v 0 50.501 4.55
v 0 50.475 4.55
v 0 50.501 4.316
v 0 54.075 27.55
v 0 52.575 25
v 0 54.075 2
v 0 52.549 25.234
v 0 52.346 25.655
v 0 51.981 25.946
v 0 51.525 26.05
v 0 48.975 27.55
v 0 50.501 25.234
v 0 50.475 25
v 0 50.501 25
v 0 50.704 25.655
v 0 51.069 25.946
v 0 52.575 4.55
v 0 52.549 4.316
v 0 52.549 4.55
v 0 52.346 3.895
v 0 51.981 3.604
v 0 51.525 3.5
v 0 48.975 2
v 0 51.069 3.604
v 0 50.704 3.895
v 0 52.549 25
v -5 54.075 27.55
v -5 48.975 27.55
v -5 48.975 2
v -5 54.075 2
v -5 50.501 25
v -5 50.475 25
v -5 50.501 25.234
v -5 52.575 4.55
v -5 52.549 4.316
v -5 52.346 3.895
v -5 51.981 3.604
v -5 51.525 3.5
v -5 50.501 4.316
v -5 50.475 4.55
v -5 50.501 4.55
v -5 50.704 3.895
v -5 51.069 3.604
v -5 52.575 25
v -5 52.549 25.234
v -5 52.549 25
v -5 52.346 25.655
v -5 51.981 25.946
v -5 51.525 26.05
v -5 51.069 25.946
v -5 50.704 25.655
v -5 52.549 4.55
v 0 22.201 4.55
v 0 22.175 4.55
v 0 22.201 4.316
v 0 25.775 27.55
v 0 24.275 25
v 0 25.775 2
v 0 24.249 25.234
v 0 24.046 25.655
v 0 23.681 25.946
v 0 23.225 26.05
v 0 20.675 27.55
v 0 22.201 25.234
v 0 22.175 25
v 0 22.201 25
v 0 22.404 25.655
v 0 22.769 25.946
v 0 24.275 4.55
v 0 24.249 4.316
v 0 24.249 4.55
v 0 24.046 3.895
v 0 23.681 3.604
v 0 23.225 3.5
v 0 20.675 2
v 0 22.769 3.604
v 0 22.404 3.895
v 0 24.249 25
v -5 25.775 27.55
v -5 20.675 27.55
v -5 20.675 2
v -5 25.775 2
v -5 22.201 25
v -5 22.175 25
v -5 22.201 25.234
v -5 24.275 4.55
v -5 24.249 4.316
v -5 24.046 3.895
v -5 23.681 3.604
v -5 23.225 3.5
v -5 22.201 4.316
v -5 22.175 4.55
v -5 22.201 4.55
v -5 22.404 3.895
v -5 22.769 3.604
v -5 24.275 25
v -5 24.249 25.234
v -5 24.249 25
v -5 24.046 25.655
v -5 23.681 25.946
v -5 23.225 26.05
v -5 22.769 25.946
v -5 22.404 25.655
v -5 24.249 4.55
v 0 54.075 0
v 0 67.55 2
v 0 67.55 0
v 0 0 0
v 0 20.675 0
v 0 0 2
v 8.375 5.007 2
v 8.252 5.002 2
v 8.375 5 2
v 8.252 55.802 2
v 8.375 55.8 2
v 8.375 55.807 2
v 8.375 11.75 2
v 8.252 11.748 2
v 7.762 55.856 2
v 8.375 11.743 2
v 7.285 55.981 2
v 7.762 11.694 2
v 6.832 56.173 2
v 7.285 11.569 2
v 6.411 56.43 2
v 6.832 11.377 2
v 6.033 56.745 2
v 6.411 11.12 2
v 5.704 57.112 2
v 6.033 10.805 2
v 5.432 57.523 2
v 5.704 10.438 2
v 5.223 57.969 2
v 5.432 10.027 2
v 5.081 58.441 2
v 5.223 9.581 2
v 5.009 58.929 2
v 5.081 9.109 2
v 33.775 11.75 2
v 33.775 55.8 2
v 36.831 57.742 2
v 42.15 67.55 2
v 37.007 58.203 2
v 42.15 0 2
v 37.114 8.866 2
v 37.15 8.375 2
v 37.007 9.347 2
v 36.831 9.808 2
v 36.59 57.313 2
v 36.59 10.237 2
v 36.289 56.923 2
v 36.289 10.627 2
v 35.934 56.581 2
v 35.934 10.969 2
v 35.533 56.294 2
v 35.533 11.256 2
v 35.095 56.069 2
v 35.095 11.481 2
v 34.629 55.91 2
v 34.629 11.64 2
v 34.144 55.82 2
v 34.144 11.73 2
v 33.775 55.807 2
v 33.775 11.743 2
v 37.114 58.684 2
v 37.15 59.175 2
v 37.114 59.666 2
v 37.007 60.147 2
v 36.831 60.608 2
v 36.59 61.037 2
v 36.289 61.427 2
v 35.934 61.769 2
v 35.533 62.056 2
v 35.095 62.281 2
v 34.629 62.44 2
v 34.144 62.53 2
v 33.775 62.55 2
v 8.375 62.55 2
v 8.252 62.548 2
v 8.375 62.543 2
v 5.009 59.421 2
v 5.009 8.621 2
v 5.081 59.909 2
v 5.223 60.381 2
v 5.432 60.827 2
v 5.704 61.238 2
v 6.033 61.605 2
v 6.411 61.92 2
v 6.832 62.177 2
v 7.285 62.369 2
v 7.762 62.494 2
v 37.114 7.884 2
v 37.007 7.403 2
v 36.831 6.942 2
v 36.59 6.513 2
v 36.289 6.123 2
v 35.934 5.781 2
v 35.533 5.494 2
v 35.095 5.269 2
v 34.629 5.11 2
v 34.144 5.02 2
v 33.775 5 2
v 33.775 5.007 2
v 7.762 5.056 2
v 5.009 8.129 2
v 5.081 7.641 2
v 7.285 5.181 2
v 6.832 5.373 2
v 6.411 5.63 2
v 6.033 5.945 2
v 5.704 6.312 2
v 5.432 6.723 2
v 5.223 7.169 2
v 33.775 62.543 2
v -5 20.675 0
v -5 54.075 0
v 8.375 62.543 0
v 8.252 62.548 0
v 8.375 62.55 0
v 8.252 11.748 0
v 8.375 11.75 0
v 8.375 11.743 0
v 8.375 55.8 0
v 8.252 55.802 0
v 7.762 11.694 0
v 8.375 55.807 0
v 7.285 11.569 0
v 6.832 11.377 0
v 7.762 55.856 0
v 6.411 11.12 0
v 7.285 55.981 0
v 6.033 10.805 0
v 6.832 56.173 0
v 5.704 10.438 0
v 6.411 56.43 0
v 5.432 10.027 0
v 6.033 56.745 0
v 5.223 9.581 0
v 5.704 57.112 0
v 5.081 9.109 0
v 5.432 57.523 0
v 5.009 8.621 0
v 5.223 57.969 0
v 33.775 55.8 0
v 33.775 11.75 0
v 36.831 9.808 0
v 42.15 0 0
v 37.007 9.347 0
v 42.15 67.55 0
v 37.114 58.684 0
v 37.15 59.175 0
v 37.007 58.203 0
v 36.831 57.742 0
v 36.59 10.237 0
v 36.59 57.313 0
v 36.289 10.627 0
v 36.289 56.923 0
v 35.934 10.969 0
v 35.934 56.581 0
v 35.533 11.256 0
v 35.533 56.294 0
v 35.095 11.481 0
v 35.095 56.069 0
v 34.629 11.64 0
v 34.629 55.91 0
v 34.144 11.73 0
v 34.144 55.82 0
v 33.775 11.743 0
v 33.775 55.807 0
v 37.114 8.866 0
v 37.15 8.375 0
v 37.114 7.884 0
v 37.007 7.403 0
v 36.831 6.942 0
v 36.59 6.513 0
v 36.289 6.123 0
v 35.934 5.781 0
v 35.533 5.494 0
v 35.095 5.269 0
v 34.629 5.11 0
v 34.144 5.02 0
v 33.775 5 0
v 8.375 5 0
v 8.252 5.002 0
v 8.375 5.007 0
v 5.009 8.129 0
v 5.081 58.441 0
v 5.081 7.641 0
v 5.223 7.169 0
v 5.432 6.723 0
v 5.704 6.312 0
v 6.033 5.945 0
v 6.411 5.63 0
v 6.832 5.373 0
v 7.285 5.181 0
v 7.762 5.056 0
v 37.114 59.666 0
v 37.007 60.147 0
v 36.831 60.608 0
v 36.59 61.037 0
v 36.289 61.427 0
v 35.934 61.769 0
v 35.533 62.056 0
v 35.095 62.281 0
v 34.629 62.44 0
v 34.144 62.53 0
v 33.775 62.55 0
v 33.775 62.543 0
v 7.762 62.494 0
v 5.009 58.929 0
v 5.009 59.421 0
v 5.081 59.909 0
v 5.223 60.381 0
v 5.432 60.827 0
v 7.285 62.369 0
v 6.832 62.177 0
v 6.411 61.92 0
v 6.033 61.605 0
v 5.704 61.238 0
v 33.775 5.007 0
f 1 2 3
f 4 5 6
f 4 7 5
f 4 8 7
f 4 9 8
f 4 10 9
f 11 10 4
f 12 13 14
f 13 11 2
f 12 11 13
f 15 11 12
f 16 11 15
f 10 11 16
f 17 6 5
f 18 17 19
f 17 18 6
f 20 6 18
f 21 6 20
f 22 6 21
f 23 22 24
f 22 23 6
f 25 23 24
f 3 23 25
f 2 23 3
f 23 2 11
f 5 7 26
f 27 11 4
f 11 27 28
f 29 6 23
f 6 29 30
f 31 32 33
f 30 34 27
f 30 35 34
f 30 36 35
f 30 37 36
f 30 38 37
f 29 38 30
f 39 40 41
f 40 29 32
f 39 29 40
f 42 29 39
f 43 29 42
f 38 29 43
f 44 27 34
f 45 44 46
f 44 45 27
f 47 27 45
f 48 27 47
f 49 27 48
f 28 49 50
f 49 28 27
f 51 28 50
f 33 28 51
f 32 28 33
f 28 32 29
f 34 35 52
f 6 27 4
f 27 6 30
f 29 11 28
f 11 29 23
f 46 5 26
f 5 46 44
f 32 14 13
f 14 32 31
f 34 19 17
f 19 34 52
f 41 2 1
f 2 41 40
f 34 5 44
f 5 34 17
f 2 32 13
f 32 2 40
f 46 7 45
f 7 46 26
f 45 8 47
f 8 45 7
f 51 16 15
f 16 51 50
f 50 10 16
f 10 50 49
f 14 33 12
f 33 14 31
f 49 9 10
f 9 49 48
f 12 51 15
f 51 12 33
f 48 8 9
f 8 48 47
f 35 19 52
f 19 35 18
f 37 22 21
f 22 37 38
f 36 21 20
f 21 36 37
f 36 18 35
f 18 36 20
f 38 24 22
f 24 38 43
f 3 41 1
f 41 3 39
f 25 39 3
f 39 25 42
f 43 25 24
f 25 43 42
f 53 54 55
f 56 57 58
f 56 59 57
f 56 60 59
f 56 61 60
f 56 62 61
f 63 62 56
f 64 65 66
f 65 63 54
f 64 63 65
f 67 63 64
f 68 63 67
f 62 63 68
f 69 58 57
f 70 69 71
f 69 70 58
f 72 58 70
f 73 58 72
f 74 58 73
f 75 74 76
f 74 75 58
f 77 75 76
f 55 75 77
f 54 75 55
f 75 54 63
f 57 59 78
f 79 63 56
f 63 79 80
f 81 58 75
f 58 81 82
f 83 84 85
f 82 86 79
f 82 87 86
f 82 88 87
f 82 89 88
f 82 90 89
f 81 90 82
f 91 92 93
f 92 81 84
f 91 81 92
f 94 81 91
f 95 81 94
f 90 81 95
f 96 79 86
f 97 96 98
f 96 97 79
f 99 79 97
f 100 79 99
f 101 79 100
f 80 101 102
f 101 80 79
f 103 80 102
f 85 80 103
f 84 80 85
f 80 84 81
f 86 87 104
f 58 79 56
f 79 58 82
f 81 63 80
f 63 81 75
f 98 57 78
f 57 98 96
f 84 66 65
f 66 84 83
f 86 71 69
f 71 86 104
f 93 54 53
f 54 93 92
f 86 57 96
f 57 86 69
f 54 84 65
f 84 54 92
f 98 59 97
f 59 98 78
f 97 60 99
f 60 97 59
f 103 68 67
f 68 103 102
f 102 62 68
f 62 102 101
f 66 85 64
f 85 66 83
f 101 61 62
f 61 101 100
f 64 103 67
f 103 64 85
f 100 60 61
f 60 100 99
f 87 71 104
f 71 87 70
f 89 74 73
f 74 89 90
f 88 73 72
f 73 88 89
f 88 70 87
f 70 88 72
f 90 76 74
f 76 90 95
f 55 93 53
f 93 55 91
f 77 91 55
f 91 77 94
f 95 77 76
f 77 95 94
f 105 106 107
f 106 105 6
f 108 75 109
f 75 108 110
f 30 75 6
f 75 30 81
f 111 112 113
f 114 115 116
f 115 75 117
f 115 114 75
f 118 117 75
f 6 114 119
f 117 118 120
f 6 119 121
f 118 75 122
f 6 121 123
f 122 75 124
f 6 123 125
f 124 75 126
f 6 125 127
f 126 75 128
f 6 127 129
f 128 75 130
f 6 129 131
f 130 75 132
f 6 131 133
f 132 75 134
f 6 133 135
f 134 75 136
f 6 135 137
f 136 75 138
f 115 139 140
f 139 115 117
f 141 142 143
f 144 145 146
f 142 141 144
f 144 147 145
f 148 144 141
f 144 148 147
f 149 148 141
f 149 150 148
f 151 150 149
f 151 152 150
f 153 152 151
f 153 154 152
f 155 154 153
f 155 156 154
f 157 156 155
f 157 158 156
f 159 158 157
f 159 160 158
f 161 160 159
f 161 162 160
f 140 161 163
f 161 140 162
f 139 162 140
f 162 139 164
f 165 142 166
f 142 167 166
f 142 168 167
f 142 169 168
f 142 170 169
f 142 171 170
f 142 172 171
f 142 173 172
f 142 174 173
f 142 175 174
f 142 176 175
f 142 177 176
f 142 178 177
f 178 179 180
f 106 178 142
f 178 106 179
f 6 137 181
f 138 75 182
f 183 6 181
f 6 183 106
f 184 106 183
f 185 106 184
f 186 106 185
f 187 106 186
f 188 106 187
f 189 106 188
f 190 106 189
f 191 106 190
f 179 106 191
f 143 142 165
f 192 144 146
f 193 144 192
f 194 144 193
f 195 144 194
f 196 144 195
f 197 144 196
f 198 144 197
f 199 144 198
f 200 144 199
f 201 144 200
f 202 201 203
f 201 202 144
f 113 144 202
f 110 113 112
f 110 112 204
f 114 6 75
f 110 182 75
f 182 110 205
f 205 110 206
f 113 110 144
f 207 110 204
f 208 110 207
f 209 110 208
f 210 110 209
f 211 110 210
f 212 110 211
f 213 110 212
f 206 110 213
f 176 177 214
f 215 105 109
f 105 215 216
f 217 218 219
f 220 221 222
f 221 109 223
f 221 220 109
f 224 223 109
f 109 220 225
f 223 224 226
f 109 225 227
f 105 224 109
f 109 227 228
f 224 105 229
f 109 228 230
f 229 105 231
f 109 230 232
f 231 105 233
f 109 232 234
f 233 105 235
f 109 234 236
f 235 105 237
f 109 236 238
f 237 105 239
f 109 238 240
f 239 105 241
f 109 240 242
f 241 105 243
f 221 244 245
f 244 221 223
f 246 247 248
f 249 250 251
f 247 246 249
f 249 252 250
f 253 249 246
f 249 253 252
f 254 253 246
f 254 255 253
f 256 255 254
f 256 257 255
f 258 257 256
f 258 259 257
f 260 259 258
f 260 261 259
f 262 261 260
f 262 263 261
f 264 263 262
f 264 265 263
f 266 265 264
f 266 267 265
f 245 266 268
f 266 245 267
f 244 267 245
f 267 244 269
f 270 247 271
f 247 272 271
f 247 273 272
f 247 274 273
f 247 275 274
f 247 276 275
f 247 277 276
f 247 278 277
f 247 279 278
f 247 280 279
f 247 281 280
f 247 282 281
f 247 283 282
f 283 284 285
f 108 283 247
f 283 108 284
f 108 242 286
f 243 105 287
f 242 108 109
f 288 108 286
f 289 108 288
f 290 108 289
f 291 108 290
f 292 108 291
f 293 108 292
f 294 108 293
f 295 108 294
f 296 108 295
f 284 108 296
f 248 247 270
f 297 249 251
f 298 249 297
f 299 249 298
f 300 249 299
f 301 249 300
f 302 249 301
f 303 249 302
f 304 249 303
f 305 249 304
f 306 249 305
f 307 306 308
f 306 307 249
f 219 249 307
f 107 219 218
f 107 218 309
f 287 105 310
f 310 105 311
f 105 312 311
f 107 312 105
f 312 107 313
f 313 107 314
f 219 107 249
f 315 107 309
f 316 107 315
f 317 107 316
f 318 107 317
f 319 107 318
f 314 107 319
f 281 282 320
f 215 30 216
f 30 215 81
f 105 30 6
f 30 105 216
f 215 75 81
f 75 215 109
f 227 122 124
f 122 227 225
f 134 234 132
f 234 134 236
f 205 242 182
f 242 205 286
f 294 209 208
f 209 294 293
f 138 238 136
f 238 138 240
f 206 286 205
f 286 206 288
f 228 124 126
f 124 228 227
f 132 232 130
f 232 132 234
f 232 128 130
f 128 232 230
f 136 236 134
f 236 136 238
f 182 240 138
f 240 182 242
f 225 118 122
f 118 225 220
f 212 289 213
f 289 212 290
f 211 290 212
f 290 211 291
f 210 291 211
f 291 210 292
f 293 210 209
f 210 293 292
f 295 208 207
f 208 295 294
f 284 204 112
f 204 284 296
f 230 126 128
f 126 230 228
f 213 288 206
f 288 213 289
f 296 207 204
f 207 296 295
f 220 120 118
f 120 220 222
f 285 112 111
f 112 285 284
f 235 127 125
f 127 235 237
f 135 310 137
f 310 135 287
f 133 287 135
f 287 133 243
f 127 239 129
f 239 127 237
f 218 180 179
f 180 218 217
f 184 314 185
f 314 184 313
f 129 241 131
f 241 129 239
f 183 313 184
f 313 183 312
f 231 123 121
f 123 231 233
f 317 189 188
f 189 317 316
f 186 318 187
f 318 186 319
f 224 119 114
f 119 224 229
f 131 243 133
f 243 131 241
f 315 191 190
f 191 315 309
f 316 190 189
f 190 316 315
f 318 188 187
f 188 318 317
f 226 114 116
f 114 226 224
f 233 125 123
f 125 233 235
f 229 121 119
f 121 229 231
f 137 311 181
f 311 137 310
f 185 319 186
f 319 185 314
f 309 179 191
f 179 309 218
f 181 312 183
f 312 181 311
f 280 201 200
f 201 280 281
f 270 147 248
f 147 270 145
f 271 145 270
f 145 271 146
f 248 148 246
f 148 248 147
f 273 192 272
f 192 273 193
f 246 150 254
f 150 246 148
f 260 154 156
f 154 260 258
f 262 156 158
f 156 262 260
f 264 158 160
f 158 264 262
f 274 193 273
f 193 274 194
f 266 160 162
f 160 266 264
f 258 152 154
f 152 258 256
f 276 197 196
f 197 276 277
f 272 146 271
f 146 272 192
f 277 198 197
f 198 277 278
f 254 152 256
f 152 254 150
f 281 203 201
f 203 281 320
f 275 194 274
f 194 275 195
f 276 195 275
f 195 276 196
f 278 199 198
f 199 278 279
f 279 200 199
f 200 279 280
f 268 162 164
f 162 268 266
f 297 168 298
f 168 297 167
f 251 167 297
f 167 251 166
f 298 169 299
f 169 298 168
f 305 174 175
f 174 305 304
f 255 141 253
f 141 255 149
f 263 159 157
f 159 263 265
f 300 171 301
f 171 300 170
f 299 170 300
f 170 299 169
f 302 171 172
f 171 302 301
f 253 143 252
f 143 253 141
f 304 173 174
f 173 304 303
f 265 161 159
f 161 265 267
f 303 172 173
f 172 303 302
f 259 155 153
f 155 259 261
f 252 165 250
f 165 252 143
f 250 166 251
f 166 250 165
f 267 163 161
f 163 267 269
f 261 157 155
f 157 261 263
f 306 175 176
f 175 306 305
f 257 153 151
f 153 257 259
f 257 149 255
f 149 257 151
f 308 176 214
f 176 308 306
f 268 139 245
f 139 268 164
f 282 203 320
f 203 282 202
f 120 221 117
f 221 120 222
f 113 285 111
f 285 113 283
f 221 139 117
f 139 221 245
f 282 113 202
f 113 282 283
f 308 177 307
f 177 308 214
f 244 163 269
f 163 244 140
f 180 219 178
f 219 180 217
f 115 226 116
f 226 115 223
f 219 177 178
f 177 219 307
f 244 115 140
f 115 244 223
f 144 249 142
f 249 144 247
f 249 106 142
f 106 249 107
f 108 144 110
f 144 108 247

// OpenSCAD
//design and code by emanresu (http://www.thingiverse.com/Emanresu)
//customizable servo mount for mounting hobby servos to an optics breadboard


  ////////////////
 // Parameters //
////////////////

/* [Global] */

/* [Servo Mount] */

//mounting hole type
mount_hole = "slot"; //[hole, slot]
//distance between servo mounting holes (mm)
screw_space = 28.3;
//mounting screw diameter (mm)
mount_screw_diameter = 2.1;
//how far the servo spline is from being centered between the mounting screws (mm)
shaft_offset = 3.6;
//desired height of servo spline (mm) assuming it is centered at the same height as the mounting screws
shaft_height = 25;
//thickness around mounting holes on posts (mm) set to < distance between edge of mounting holes and servo body
post_thick = 1.5;
//mounting post width
post_width = 5;

/* [Mount Base] */

//what grid are your breadboard holes spaced on? (mm)
breadboard_grid = 25.4;
//diameter of clearance hole for the type of screws your breadboard uses (mm)
breadboard_hole_diameter = 6.75;
//how many holes do you want the mounting slots to cover?
holes_x = 2;
//how many holes (inclusive) do you want the mounting slots to be spaced apart?
holes_y =3;
//how thick do you want the base? (mm)
base_thick = 2;
//how much clearance around the outside of the mounting slots do you want? (mm)
base_clearance = 5;

/* [Hidden] */

//Set openSCAD resolution
$fa=1;
$fs=0.5;

mount_screw_radius = mount_screw_diameter/2;
breadboard_hole_radius = breadboard_hole_diameter/2;


  /////////////
 // Modules //
/////////////

module mounting_holes() {
	// generates the mounting slots for bolting to the breadboard
	for (i=[0:holes_x-1:holes_x-1]) {
		for (t=[0:holes_y-1:holes_y-1]) {
			translate([i*breadboard_grid, t*breadboard_grid, 0]) {
				cylinder(r=breadboard_hole_radius, h=base_thick+1, center=false);
			}
		}	
	}
	for (j=[0:holes_y-1:holes_y-1]) {
		translate([0, j*breadboard_grid-breadboard_hole_diameter/2, 0]) {
			cube(size=[(holes_x-1)*breadboard_grid, breadboard_hole_diameter, base_thick+1], center=false);
		}
	}		
}

module mounting_plate() {
	// body...
	difference() {
		cube(size=[(holes_x-1)*breadboard_grid+2*base_clearance+breadboard_hole_diameter,
		    (holes_y-1)*breadboard_grid+2*base_clearance+breadboard_hole_diameter, base_thick], center=false);
		translate([base_clearance+breadboard_hole_radius, base_clearance+breadboard_hole_radius, -0.5]) {
			mounting_holes();
		}
	}	
}

module mount_post() {
	// body...
	if (mount_hole == "hole") {
		difference() {
			cube(size=[post_width, mount_screw_diameter+2*post_thick, shaft_height-base_thick+mount_screw_radius+post_thick], center=true);
			translate([0, 0, (shaft_height-base_thick+mount_screw_radius+post_thick)/2-(mount_screw_radius+post_thick)]) {
				rotate([0, 90, 0]) {
					cylinder(r=mount_screw_radius, h=post_width+1, center=true);
				}	
			}
		}	
	}
	if (mount_hole == "slot") {
		difference() {
			cube(size=[post_width, mount_screw_diameter+2*post_thick, shaft_height-base_thick+mount_screw_radius+post_thick], center=true);
			cube(size=[post_width+1, mount_screw_diameter, shaft_height-base_thick-mount_screw_radius-post_thick], center=true);
			translate([0, 0, (shaft_height-base_thick-mount_screw_radius-post_thick)/2]) {
				rotate([0, 90, 0]) {
					cylinder(r=mount_screw_radius, h=post_width+1, center=true);
				}	
			}
			translate([0, 0, -(shaft_height-base_thick-mount_screw_radius-post_thick)/2]) {
				rotate([0, 90, 0]) {
					cylinder(r=mount_screw_radius, h=post_width+1, center=true);
				}	
			}
		}
	}
}

module servo_mount() {
	// body...
	union() {
		translate([0, screw_space/2, (shaft_height-base_thick+mount_screw_radius+post_thick)/2+base_thick]) {
			mount_post();
		}
		translate([0, -screw_space/2, (shaft_height-base_thick+mount_screw_radius+post_thick)/2+base_thick]) {
			mount_post();
		}
		translate([0, 0, base_thick/2]) {
			cube(size=[post_width, screw_space+mount_screw_diameter+2*post_thick, base_thick], center=true);	
		}
	}
}

module bb_servo_mount() {
	// body...
	union() {
		translate([-post_width/2, ((holes_y-1)*breadboard_grid+2*base_clearance+breadboard_hole_diameter)/2 + shaft_offset, 0]) {
			servo_mount();
		}
		mounting_plate();
	}	
}


  //////////////////
 // Control Code //
//////////////////

bb_servo_mount();
